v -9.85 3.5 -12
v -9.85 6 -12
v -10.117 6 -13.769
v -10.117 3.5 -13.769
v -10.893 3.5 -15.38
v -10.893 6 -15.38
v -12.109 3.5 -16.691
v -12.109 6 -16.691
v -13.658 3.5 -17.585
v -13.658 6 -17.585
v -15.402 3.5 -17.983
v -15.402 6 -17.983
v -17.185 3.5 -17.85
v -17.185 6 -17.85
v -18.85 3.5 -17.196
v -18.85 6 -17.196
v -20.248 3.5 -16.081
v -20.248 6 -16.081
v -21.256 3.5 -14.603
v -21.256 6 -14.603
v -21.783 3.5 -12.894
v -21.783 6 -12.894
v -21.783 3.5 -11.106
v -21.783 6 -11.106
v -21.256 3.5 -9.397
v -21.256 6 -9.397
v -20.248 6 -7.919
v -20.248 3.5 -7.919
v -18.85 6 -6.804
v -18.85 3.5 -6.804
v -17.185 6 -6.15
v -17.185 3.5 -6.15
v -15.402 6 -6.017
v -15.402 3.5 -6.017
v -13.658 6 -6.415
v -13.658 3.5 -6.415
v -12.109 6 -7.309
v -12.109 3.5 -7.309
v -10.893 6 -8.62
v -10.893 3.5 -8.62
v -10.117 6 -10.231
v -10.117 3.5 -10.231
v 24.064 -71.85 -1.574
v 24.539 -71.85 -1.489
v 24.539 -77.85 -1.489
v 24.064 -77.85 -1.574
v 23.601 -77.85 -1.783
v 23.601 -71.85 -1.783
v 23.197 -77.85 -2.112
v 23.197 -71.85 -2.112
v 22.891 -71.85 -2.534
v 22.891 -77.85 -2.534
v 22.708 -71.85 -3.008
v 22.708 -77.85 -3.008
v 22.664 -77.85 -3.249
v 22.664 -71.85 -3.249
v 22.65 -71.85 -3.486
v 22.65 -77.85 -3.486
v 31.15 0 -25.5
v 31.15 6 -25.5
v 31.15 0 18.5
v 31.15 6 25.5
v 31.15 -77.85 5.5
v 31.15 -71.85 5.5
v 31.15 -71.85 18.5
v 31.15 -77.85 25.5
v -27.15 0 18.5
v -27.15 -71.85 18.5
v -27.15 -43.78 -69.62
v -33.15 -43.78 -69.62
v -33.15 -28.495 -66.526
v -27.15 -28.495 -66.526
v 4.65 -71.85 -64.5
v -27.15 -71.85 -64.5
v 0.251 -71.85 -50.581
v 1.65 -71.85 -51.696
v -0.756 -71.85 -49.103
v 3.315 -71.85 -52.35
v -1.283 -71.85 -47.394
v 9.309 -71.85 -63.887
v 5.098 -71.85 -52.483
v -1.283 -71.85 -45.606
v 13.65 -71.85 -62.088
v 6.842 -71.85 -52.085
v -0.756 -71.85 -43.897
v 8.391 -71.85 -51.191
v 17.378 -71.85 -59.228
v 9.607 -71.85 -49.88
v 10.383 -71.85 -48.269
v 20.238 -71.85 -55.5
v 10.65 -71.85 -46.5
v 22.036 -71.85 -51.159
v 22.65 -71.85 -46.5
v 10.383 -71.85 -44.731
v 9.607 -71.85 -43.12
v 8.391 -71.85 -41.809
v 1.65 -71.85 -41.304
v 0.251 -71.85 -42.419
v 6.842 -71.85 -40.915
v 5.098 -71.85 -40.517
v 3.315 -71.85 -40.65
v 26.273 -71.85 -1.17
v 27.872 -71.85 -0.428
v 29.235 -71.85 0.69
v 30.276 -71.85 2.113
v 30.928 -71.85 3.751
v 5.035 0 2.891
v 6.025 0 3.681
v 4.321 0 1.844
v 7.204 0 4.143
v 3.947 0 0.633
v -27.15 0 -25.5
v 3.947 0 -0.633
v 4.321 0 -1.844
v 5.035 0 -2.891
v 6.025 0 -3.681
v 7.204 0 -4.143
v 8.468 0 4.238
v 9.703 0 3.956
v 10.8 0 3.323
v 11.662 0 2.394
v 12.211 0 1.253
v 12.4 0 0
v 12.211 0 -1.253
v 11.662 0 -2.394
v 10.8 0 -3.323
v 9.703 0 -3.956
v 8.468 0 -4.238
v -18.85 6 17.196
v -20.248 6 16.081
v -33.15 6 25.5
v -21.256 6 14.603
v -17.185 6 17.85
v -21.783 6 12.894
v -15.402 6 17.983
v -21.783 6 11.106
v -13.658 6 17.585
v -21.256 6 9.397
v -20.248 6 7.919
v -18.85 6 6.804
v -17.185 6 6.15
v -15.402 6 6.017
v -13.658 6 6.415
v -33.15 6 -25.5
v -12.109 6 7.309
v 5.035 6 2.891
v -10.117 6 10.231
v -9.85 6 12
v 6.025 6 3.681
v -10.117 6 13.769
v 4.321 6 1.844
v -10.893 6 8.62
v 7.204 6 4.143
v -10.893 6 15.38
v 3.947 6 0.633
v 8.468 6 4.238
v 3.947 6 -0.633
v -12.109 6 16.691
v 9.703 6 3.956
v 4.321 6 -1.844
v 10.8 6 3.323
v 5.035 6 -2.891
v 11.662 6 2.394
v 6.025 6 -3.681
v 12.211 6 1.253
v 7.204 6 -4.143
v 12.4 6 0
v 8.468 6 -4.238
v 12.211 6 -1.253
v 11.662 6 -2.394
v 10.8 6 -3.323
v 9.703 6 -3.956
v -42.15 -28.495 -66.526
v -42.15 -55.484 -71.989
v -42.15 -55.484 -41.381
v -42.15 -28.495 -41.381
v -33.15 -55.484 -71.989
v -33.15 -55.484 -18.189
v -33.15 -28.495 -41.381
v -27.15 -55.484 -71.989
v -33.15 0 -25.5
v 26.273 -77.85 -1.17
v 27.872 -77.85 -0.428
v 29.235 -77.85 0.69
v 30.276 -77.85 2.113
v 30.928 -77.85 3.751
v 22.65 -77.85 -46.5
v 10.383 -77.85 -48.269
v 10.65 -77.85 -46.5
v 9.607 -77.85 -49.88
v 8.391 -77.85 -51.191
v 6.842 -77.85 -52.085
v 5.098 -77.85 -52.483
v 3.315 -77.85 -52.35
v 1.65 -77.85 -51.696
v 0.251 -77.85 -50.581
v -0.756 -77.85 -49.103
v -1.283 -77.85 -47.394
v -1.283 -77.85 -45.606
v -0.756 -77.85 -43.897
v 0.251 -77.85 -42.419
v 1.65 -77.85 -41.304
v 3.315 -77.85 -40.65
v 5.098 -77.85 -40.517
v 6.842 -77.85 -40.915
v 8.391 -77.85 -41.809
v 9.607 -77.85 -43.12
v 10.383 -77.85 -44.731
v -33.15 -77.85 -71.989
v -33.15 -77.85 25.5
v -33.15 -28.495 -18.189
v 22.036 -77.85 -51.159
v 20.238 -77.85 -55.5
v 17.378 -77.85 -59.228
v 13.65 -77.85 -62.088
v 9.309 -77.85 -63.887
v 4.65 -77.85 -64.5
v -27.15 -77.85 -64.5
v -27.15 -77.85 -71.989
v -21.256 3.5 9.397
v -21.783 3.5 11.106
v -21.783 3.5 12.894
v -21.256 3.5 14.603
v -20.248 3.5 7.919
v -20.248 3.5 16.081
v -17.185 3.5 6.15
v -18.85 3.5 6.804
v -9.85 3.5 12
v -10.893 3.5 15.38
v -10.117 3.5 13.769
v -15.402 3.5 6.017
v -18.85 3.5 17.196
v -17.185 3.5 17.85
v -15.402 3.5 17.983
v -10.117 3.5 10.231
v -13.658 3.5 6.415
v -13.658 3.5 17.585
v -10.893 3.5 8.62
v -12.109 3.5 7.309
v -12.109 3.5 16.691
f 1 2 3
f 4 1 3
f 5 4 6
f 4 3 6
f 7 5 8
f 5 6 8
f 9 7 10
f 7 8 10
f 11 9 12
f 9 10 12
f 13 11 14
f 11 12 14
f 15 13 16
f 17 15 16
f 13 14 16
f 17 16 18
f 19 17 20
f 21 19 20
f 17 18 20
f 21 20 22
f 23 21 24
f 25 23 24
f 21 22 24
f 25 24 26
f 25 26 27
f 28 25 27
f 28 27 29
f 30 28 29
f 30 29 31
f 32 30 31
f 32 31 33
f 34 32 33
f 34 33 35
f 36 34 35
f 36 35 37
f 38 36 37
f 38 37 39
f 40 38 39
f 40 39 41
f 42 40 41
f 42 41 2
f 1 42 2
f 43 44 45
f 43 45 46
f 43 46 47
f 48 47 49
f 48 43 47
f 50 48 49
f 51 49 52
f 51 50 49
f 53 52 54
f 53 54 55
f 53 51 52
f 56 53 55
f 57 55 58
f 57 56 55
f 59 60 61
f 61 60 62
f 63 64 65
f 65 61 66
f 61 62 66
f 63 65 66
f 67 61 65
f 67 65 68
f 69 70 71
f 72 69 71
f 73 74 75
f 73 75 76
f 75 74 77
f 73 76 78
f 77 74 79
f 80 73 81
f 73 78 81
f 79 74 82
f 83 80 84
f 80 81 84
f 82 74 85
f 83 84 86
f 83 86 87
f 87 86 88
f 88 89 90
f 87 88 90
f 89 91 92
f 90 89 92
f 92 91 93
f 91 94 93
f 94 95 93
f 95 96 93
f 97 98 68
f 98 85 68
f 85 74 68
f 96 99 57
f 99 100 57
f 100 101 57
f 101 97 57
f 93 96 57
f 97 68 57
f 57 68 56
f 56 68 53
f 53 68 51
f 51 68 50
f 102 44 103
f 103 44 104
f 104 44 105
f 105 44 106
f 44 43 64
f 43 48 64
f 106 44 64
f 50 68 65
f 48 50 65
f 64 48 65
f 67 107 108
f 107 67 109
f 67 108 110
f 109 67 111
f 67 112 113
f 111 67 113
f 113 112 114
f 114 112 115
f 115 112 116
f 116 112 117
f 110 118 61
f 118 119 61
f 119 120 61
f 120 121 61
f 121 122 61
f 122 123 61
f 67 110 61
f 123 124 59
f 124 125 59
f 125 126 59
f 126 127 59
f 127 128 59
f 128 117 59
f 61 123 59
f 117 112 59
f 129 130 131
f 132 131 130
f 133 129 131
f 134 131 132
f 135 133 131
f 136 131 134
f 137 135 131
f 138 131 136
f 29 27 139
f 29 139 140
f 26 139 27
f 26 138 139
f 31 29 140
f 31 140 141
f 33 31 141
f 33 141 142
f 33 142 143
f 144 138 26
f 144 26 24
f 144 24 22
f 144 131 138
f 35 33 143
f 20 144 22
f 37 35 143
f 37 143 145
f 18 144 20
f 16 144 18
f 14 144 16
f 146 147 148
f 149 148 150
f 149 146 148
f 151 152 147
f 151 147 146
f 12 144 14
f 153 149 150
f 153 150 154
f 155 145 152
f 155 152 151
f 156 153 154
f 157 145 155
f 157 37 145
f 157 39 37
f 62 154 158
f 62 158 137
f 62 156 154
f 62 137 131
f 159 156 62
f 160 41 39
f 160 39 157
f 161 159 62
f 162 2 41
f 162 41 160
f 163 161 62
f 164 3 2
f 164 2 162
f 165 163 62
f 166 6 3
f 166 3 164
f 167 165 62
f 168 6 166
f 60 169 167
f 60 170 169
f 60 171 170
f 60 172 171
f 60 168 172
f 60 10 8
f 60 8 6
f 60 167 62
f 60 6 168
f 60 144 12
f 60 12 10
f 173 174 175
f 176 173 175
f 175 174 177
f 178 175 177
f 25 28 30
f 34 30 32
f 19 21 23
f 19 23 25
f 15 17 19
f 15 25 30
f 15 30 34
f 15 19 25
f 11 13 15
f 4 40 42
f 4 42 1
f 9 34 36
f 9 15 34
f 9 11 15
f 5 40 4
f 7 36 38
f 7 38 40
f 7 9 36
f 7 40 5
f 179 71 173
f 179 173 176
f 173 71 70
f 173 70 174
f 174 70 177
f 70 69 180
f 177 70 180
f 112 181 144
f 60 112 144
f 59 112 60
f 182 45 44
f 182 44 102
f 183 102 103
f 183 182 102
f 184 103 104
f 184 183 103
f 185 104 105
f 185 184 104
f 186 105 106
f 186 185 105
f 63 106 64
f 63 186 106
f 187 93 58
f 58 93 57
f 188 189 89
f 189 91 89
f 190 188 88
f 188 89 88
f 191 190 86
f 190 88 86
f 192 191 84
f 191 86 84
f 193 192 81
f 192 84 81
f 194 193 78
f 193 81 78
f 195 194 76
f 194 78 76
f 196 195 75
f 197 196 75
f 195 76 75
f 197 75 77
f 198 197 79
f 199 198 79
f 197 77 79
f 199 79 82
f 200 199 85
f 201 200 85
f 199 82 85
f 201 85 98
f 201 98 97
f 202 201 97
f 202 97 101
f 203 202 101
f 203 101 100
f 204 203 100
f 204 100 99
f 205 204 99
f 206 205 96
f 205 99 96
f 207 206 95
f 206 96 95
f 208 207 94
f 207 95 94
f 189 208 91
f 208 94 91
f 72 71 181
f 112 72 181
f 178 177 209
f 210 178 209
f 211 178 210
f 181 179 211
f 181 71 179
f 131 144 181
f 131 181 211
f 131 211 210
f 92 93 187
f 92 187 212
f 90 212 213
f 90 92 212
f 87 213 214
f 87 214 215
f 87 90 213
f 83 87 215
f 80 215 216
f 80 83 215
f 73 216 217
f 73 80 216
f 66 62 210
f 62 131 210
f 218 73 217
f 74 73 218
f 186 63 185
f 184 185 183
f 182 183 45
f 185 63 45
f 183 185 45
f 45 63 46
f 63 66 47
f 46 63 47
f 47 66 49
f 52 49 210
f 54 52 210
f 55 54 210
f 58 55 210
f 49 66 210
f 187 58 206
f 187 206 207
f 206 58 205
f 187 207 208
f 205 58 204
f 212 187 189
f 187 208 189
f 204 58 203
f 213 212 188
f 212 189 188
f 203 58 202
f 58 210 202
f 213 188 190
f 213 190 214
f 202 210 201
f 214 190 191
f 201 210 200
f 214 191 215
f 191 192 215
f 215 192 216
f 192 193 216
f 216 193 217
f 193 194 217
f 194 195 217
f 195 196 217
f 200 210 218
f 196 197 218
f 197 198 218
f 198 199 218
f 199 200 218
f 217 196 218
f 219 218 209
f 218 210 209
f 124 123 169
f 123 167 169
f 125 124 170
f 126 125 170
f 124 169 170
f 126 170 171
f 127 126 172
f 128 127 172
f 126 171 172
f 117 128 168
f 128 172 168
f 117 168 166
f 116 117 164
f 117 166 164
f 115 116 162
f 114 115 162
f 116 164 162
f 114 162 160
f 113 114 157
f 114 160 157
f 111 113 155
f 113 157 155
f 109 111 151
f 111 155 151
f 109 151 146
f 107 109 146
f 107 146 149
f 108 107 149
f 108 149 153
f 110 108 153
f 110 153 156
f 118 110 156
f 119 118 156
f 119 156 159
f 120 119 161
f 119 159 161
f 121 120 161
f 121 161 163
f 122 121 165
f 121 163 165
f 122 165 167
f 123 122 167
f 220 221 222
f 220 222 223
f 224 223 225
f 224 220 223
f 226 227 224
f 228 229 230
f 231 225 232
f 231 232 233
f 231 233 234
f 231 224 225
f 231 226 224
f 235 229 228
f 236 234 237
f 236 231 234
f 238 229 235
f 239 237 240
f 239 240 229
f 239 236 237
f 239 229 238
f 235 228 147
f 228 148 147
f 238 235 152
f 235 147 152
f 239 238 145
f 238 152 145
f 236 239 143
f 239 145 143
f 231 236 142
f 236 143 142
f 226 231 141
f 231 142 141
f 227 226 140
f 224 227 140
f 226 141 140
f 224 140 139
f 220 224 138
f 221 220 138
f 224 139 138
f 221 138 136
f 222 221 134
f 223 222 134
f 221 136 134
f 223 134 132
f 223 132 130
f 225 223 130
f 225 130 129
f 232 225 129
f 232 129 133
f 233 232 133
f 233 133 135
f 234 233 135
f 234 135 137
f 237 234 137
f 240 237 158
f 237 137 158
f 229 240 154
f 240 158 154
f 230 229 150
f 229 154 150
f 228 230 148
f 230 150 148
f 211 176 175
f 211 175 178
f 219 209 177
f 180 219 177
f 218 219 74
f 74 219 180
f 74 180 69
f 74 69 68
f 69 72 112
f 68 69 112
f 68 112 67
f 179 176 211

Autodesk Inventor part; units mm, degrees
ref_plane "YZ Plane" through (0, 0, 0) normal (1, 0, 0) x (0, 1, 0)
ref_plane "XZ Plane" through (0, 0, 0) normal (0, 1, 0) x (-1, 0, 0)
ref_plane "XY Plane" through (0, 0, 0) normal (0, 0, 1) x (1, 0, 0)
sketch "Sketch1" plane through (0, 0, 0) normal (0, 1, 0) x (-1, 0, 0)
  line L0 (0, -25.5) -> (-34.15, -25.5)
  line L1 (-34.15, -25.5) -> (-34.15, 0)
  line L2 (-34.15, 0) -> (-34.15, 25.5)
  line L3 (-34.15, 25.5) -> (0, 25.5)
  line L4 (0, 25.5) -> (34.15, 25.5)
  line L5 (34.15, 25.5) -> (34.15, 0)
  line L6 (34.15, 0) -> (34.15, -25.5)
  line L7 (34.15, -25.5) -> (0, -25.5)
  point P0 (0, 0)
extrude "Extrusion1" add sketch "Sketch1" along normal blind 7
sketch "Sketch3" plane through (-34.15, 0, 25.5) normal (0, 0, 1) x (1, 0, 0)
  line L0 (0, 0) -> (0, -78.85)
  point P0 (34.15, 0)
  dimension "d7" = 78.85
sketch "Sketch4" plane through (-34.15, 0, -25.5) normal (-1, 0, 0) x (0, 0, 1)
  line L0 (51, 0) -> (51, -78.85)
  line L1 (51, -78.85) -> (-39, -78.85)
  line L2 (-39, -78.85) -> (-39, -71.85)
  line L3 (0, 0) -> (-39, -71.85)
  line L4 (0, 0) -> (51, 0)
  point P0 (25.5, 0)
  dimension "d10" = 90
  dimension "d11" = 7
extrude "Extrusion2" add sketch "Sketch4" against normal blind 7
sketch "Sketch6" plane through (0, 7, 0) normal (0, 1, 0) x (1, 0, 0)
  line L0 (34.15, -25.5) -> (34.15, 25.5) projected
  line L1 (34.15, 25.5) -> (34.15, 0)
  line L2 (-34.15, 25.5) -> (-34.15, -25.5) projected
  circle A0 centre (8.15, 0) radius 5
  point P0 (0, 0)
  dimension "d20" = 10
extrude "Extrusion4" cut sketch "Sketch6" against normal blind 10
sketch "Sketch7" plane through (-27.15, 0, -25.5) normal (1, 0, 0) x (0, 0, -1)
  line L0 (-51, -78.85) -> (39, -78.85) projected
  line L1 (-51, -78.85) -> (39, -78.85)
  line L2 (39, -78.85) -> (39, -71.85) projected
  line L3 (39, -78.85) -> (39, -71.85)
  line L4 (39, -71.85) -> (-51, -71.85)
  line L5 (-51, 0) -> (-51, -78.85) projected
  line L6 (-51, -78.85) -> (-51, -71.85)
  point P0 (-25.5, 0)
sketch "Sketch8" plane through (0, 0, 0) normal (0, -1, 0) x (1, 0, 0)
  circle A0 centre (8.15, 0) radius 5 projected
  line L0 (8.15, 18.5) -> (34.15, 18.5)
  line L1 (34.15, 25.5) -> (34.15, -25.5) projected
  line L2 (8.15, 25.5) -> (34.15, 25.5)
  line L3 (8.15, 25.5) -> (-27.15, 25.5)
  line L4 (-27.15, 25.5) -> (-27.15, -25.5) projected
  line L5 (8.15, 18.5) -> (-27.15, 18.5)
  line L6 (34.15, 25.5) -> (34.15, 18.5)
  line L7 (-27.15, 25.5) -> (-27.15, 18.5)
  point P0 (0, 0)
extrude "Extrusion6" add sketch "Sketch7" along normal blind 58.5
extrude "Extrusion7" add sketch "Sketch8" along normal blind 78.75 contours L5 L4 L3 L2 L1 L0
sketch "Sketch9" plane through (31.35, 0, -25.5) normal (1, 0, 0) x (0, 0, -1)
  line L0 (-51, -78.75) -> (-51, 7) projected
  line L1 (-44, 0) -> (-44, -71.85) projected
  line L2 (-51, -78.75) -> (-44, -78.75)
  line L3 (-44, -78.75) -> (-44, -71.85)
  line L4 (-44, -71.85) -> (-51, -71.85)
  line L5 (-51, -71.85) -> (-51, -78.75)
  point P0 (-25.5, 0)
extrude "Extrusion8" cut sketch "Sketch9" along normal blind 10
sketch "Sketch10" plane through (0, 7, 0) normal (0, 1, 0) x (1, 0, 0)
  point P0 (0, 0)
sketch "Boceto11" plane through (-34.15, -78.85, -64.5) normal (0, -1, 0) x (1, 0, 0)
  line L0 (72.0718, 89.9914) -> (72.0718, 37.9883)
  line L1 (72.0718, 37.9883) -> (65.5278, 37.9883)
  line L2 (65.5278, 37.9883) -> (65.5278, 89.9914)
  line L3 (72.0718, 89.9914) -> (72.0718, 92.1751)
  line L4 (72.0718, 92.1751) -> (65.5278, 92.1751)
  line L5 (65.5278, 92.1751) -> (65.5278, 89.9914)
  point P0 (34.15, 64.5)
extrude "Extrusión9" cut sketch "Boceto11" against normal blind 1000
sketch "Boceto18" plane through (-34.15, -78.85, 25.5) normal (0, 0, 1) x (1, 0, 0)
  point P0 (34.15, 78.85)
sketch "Boceto23" plane through (-27.15, 0, -25.5) normal (0, 0.4770514, -0.8788754) x (-1, 0, 0)
  point P0 (-27.15, 12.1648)
sketch "Boceto24" plane through (-27.15, 0, -25.5) normal (0, 0, -1) x (-1, 0, 0)
  line L0 (7, -71.85) -> (7, -78.85) projected
  line L1 (7, -78.35) -> (7, -78.85)
  line L2 (7, -78.85) -> (-58.5, -78.85) projected
  line L3 (-58.5, -78.85) -> (-58.5, -77.85)
  line L4 (-58.5, -71.85) -> (-58.5, -78.85) projected
  line L5 (-58.5, -77.85) -> (6, -77.85)
  line L6 (7, -77.85) -> (7, -78.85)
  line L7 (7, -78.85) -> (-58.8392, -78.85)
  line L8 (-58.5278, 7) -> (7, 7) projected
  line L9 (7, -78.85) -> (7, 7)
  line L10 (7, 7) -> (6, 7)
  line L11 (6, 6) -> (6, -77.85)
  line L12 (-58.5278, -71.85) -> (-58.5278, 7) projected
  line L13 (-58.5278, 7) -> (-58.5278, 6)
  line L14 (-58.5278, 6) -> (6, 6)
  line L15 (7, 0) -> (7, 7) projected
  line L16 (7, 6) -> (7, 7)
  line L17 (7, 7) -> (-58.5278, 7)
  point P0 (-27.15, 0)
  dimension "d65" = 1
  dimension "d66" = 1
  dimension "d67" = 1
extrude "Extrusión19" cut sketch "Boceto24" along normal mid plane 1000
sketch "Boceto25" plane through (31.35, -71.85, -64.5) normal (0, 0, -1) x (-1, 0, 0)
  point P0 (31.35, 71.85)
sketch "Boceto27" plane through (31.3778, 0, -25.5) normal (0, 0, -1) x (-1, 0, 0)
  line L0 (0, -71.85) -> (0, 6) projected
  line L1 (0, 6) -> (0.228, 6)
  line L2 (0, 6) -> (64.5278, 6) projected
  line L3 (0.228, 6) -> (0.228, -77.85)
  line L4 (0.0278, -77.85) -> (64.5278, -77.85) projected
  line L5 (0.0278, -71.85) -> (0.0278, -77.85) projected
  line L6 (0.228, -77.85) -> (0.0278, -77.85)
  line L7 (0.0278, -77.85) -> (0, 6)
  line L8 (0, 6) -> (0, -77.85)
  line L9 (0, -77.85) -> (0.0278, -77.85)
  point P0 (31.3778, 0)
  dimension "d73" = 0.228
extrude "Extrusión21" cut sketch "Boceto27" along normal mid plane 1000
sketch "Boceto28" plane through (-33.15, 0, -25.5) normal (-1, 0, 0) x (0, 0, 1)
  point P0 (25.5, 0)
sketch "Boceto30" plane through (-33.15, 0, -25.5) normal (-1, 0, 0) x (0, 0, 1)
  point P0 (25.5, 0)
sketch "Boceto31" plane through (-33.15, 0, -25.5) normal (-1, 0, 0) x (0, 0, 1)
  circle A0 centre (64.38, -38.5153) radius 2.6
  point P0 (25.5, 0)
  point P1 (64.38, -49.4573)
sketch "Boceto32" plane through (-27.15, -71.85, 18.5) normal (0, 1, 0) x (1, 0, 0)
  circle A0 centre (47, 71.5) radius 5 projected
  circle A1 centre (47, 71.5) radius 5
  line L0 (52, 71.5) -> (58.2998, 71.5)
  line L1 (67, 83) -> (67, -7)
  line L2 (58.2998, -7) -> (-6, -7) projected
  line L3 (67, -7) -> (58.2998, -7)
  line L4 (58.2998, -7) -> (58.2998, 83)
  line L5 (47, 76.5) -> (47, 83)
  line L6 (-6, 83) -> (0, 83) projected
  line L7 (-6, 83) -> (-6, 91.5)
  line L8 (-6, 91.5) -> (67, 91.5)
  line L9 (67, 91.5) -> (67, 83)
  line L10 (-6, 83) -> (58.2998, 83)
  point P0 (27.15, 18.5)
extrude "Extrusión23" add sketch "Boceto32" against normal blind 6 contours L4 L10 L6 L7 L8 L9 L1 L3
sketch "Boceto33" plane through (-33.15, -77.85, 25.5) normal (-1, 0, 0) x (0, 0, 1)
  line L0 (0, 83.85) -> (0, 0) projected
  line L1 (0, 74.4354) -> (10.1255, 74.4354)
  line L2 (10.1255, 74.4354) -> (10.1255, 56.6115)
  line L3 (10.9445, 54.9975) -> (18.0243, 49.8171)
  line L4 (18.8039, 48.5979) -> (20.1084, 42.1205)
  line L5 (0, 11.6181) -> (18.1478, 11.6181)
  line L6 (20.1478, 13.6181) -> (20.1478, 41.7256)
  arc A0 (10.1255, 56.6115) -> (10.9445, 54.9975) centre (12.1255, 56.6115) ccw
  arc A1 (18.8039, 48.5979) -> (18.0243, 49.8171) centre (16.8433, 48.203) ccw
  arc A2 (20.1478, 41.7256) -> (20.1084, 42.1205) centre (18.1478, 41.7256) ccw
  arc A3 (18.1478, 11.6181) -> (20.1478, 13.6181) centre (18.1478, 13.6181) ccw
  point P0 (-25.5, 77.85)
  dimension "d91" = 2
extrude "Extrusión24" add sketch "Boceto33" against normal blind 6
extrude "Extrusión25" cut sketch "Boceto31" against normal blind 6
sketch "Boceto34" plane through (-27.15, -77.85, 25.5) normal (1, 0, 0) x (0, 0, -1)
  line L0 (-18.1478, 11.6181) -> (-21.8775, 11.6181)
  line L1 (-21.8775, 11.6181) -> (-21.8775, 48.067)
  line L2 (-21.8775, 48.067) -> (-10.1255, 56.8358)
  line L3 (-10.1255, 74.4354) -> (-10.1255, 56.6115) projected
  line L4 (-10.1255, 56.8358) -> (-10.1255, 48.9642)
  line L5 (-10.1255, 48.9642) -> (-16.6729, 42.1735)
  line L6 (-16.6729, 42.1735) -> (-18.1478, 11.6181)
  point P0 (25.5, 77.85)
extrude "Extrusión26" add sketch "Boceto34" against normal blind 6
fillet "Empalme5" radius 10 3 edges at (-30.15, -21.0142, 35.6255) (-30.15, -29.783, 47.3775) (-30.15, -66.2319, 47.3775)
sketch "Boceto37" plane through (-33.15, 6, 25.5) normal (0, 1, 0) x (1, 0, 0)
  circle A0 centre (41.3, 25.5) radius 6 projected
  line L0 (41.3, 25.5) -> (17.3, 25.5)
  line L1 (17.3, 25.5) -> (17.3, 13.5)
  line L2 (17.3, 13.5) -> (17.3, 37.5)
  circle A1 centre (17.3, 13.5) radius 6
  circle A2 centre (17.3, 37.5) radius 6
  point P0 (33.15, 25.5)
  dimension "d106" = 24
  dimension "d107" = 12
  dimension "d108" = 24
  dimension "d109" = 12
  dimension "d110" = 12
extrude "Extrusión29" cut sketch "Boceto37" against normal blind 2.5 contours A1 | A2
sketch "Boceto39" plane through (-27.15, -71.85, 18.5) normal (0, 1, 0) x (1, 0, 0)
  line L0 (58.2998, -7) -> (58.2998, 0)
  line L1 (58.2998, 44) -> (58.2998, 91.5)
  line L2 (-6, 91.5) -> (67, 91.5) projected
  line L3 (0, 0) -> (58.2998, 0) projected
  line L4 (58.2998, 0) -> (58.2998, -7) projected
  line L5 (58.2998, -7) -> (67, -7) projected
  line L6 (58.2998, -7) -> (67, -7)
  line L7 (67, 91.5) -> (-6, 91.5) projected
  line L8 (67, -7) -> (67, 91.5)
  line L9 (67, 91.5) -> (58.2998, 91.5)
  line L10 (58.2998, 0) -> (58.2998, 44)
  point P0 (27.15, 18.5)
extrude "Extrusión31" cut sketch "Boceto39" against normal blind 10
sketch "Boceto41" plane through (-27.15, -71.85, 18.5) normal (0, 1, 0) x (1, 0, 0)
  line L0 (58.2998, 91.5) -> (58.2998, -7) projected
  line L1 (58.2998, 91.5) -> (31.7998, 91.5)
  line L2 (31.7998, 91.5) -> (31.7998, 65)
  line L3 (31.7998, 65) -> (58.2998, 65)
  line L4 (58.2998, 65) -> (58.2998, 91.5)
  circle A0 centre (31.7998, 65) radius 6
  point P0 (27.15, 18.5)
  dimension "d124" = 26.5
  dimension "d125" = 26.5
  dimension "d126" = 12
extrude "Extrusión32" cut sketch "Boceto41" against normal blind 10 contours A0 L2 L3 | L3 L2 A0
sketch "Sketch42" plane through (-27.15, -71.85, 18.5) normal (0, 1, 0) x (1, 0, 0)
  circle A0 centre (31.7998, 65) radius 6 projected
  line L0 (31.7998, 71) -> (31.7998, 65)
  circle A1 centre (31.7998, 65) radius 18
  line L1 (0, 0) -> (0, 83) projected
  line L2 (0, 83) -> (31.7998, 83)
  line L3 (58.2998, 91.5) -> (-6, 91.5) projected
  line L4 (49.7998, 65) -> (49.7998, 0)
  line L5 (58.2998, 0) -> (0, 0) projected
  line L6 (0, 0) -> (58.2998, 0) projected
  line L7 (49.7998, 0) -> (58.2998, 0)
  line L8 (58.2998, 91.5) -> (58.2998, -7) projected
  line L9 (58.2998, 0) -> (58.2998, 91.5)
  line L10 (0, 83) -> (0, 44) projected
  line L11 (0, 83) -> (-6, 83)
  line L12 (-6, 91.5) -> (-6, 83) projected
  line L13 (-6, 83) -> (-6, 91.5)
  line L14 (58.2998, 91.5) -> (58.2998, 0) projected
  line L15 (-6, 91.5) -> (58.2998, 91.5)
  point P0 (27.15, 18.5)
  point P1 (58.2998, -7)
  dimension "d129" = 36
extrude "Extrusion33" cut sketch "Sketch42" against normal blind 10 contours A1 L2 L11 L12 L3 L8 L5 L4
sketch "Sketch43" plane through (-27.15, -71.85, 18.5) normal (0, 0, -1) x (-1, 0, 0)
  line L0 (6, -6) -> (-58.2998, -6) projected
  line L1 (0, 0) -> (-49.7998, 0) projected
  line L2 (-58.2998, -6) -> (-49.7998, -6)
  line L3 (-49.7998, -6) -> (-49.7998, 0)
  line L4 (-49.7998, 0) -> (-58.2998, 0)
  line L5 (-58.2998, 0) -> (-58.2998, -6)
  point P0 (-27.15, 71.85)
extrude "Extrusion34" add sketch "Sketch43" along normal blind 20
fillet "Fillet7" radius 7 1 edges at (31.1498, -74.85, -1.5)
fillet "Fillet8" radius 2 1 edges at (22.6498, -74.85, -1.5)
sketch "Sketch44" plane through (-33.15, 0, -25.5) normal (-1, 0, 0) x (0, 0, 1)
  line L0 (68.8577, -26.7837) -> (65.1452, -24.0136) projected
  line L1 (61.1255, -3.4146) -> (51, -3.4146) projected
  line L2 (65.1452, -24.0136) -> (51, -24.0136)
  line L3 (51, -24.0136) -> (51, -3.4146)
  line L4 (51, -3.4146) -> (65.1452, -3.4146)
  line L5 (65.1452, -3.4146) -> (65.1452, -24.0136)
  point P0 (25.5, 0)
extrude "Extrusion35" cut sketch "Sketch44" against normal blind 20
sketch "Sketch45" plane through (-33.15, 6, 25.5) normal (0, 1, 0) x (1, 0, 0)
  circle A0 centre (41.3, 25.5) radius 5 projected
  circle A1 centre (41.3, 25.5) radius 4.25
  circle A2 centre (41.3, 25.5) radius 5
  point P0 (33.15, 25.5)
  dimension "d138" = 8.5
extrude "Extrusion36" add sketch "Sketch45" against normal blind 6
sketch "Sketch46" plane through (-33.15, 0, -25.5) normal (-1, 0, 0) x (0, 0, 1)
  point P0 (25.5, 0)
sketch "Sketch47" plane through (-33.15, 0, -25.5) normal (-1, 0, 0) x (0, 0, 1)
  line L0 (-44.1201, -43.7798) -> (-41.0263, -28.4947)
  line L1 (-39, -71.85) -> (0, 0) projected
  line L2 (-41.0263, -28.4947) -> (0, 0)
  line L3 (0, 0) -> (-39, -71.85)
  line L4 (-44.1201, -43.7798) -> (-44.1201, -71.85)
  line L5 (-44.1201, -71.85) -> (-39, -71.85)
  point P0 (25.5, 0)
extrude "Extrusion37" add sketch "Sketch47" against normal blind 6
sketch "Sketch48" plane through (-33.15, 6, -25.5) normal (-1, 0, 0) x (0, 0, 1)
  point P0 (25.5, -6)
sketch "Sketch49" plane through (-33.15, 6, -25.5) normal (-1, 0, 0) x (0, 0, 1)
  point P0 (25.5, -6)
sketch "Sketch50" plane through (-33.15, 6, -25.5) normal (-1, 0, 0) x (0, 0, 1)
  line L0 (-44.1201, -49.7798) -> (-41.0263, -34.4947) projected
  line L1 (-41.0263, -34.4947) -> (-46.4891, -61.4839)
  line L2 (-39, -83.85) -> (51, -83.85) projected
  line L3 (-39, -83.85) -> (-46.4891, -83.85)
  line L4 (-46.4891, -83.85) -> (-46.4891, -61.4839)
  line L5 (-41.0263, -34.4947) -> (-39, -69.2782)
  line L6 (-39, -69.2782) -> (-39, -83.85)
  point P0 (25.5, -6)
extrude "Extrusion38" add sketch "Sketch50" against normal blind 6
sketch "Sketch51" plane through (-33.15, 6, -25.5) normal (-1, 0, 0) x (0, 0, 1)
  line L0 (-41.0263, -34.4947) -> (-46.4891, -61.4839) projected
  line L1 (-41.0263, -34.4947) -> (-46.4891, -61.4839)
  line L2 (-46.4891, -61.4839) -> (-15.8808, -61.4839)
  line L3 (-41.0263, -34.4947) -> (-15.8808, -34.4947)
  line L4 (-15.8808, -34.4947) -> (-15.8808, -61.4839)
  point P0 (25.5, -6)
extrude "Extrusion39" add sketch "Sketch51" along normal blind 9
sketch "Sketch52" plane through (-33.15, -55.4839, -71.9891) normal (0, -1, 0) x (1, 0, 0)
  line L0 (-9, 30.6084) -> (0, 53.8004)
  line L1 (0, 0) -> (0, 97.4891) projected
  line L2 (0, 30.6084) -> (0, 53.8004)
  line L3 (0, 30.6084) -> (-9, 30.6084)
  point P0 (33.15, 71.9891)
extrude "Extrusion40" add sketch "Sketch52" against normal blind 26.989
sketch "Sketch53" plane through (-33.15, -55.4839, -18.1887) normal (-0.9322642, 0, 0.3617781) x (0.3617781, 0, 0.9322642)
  point P0 (28.9496, 55.4839)
sketch "Sketch54" plane through (-33.15, 6, -25.5) normal (-1, 0, 0) x (0, 0, 1)
  line L0 (51, -72.2319) -> (51, -83.85) projected
  line L1 (51, -83.85) -> (86.3988, -83.85)
  line L2 (86.3988, -83.85) -> (86.3988, -18.2813)
  line L3 (86.3988, -18.2813) -> (51, -18.2813)
  line L4 (51, -18.2813) -> (51, -83.85)
  point P0 (25.5, -6)
extrude "Extrusion41" cut sketch "Sketch54" against normal blind 26.989
properties part number "DC23[R][F][2]" material "Aluminio 6061"
